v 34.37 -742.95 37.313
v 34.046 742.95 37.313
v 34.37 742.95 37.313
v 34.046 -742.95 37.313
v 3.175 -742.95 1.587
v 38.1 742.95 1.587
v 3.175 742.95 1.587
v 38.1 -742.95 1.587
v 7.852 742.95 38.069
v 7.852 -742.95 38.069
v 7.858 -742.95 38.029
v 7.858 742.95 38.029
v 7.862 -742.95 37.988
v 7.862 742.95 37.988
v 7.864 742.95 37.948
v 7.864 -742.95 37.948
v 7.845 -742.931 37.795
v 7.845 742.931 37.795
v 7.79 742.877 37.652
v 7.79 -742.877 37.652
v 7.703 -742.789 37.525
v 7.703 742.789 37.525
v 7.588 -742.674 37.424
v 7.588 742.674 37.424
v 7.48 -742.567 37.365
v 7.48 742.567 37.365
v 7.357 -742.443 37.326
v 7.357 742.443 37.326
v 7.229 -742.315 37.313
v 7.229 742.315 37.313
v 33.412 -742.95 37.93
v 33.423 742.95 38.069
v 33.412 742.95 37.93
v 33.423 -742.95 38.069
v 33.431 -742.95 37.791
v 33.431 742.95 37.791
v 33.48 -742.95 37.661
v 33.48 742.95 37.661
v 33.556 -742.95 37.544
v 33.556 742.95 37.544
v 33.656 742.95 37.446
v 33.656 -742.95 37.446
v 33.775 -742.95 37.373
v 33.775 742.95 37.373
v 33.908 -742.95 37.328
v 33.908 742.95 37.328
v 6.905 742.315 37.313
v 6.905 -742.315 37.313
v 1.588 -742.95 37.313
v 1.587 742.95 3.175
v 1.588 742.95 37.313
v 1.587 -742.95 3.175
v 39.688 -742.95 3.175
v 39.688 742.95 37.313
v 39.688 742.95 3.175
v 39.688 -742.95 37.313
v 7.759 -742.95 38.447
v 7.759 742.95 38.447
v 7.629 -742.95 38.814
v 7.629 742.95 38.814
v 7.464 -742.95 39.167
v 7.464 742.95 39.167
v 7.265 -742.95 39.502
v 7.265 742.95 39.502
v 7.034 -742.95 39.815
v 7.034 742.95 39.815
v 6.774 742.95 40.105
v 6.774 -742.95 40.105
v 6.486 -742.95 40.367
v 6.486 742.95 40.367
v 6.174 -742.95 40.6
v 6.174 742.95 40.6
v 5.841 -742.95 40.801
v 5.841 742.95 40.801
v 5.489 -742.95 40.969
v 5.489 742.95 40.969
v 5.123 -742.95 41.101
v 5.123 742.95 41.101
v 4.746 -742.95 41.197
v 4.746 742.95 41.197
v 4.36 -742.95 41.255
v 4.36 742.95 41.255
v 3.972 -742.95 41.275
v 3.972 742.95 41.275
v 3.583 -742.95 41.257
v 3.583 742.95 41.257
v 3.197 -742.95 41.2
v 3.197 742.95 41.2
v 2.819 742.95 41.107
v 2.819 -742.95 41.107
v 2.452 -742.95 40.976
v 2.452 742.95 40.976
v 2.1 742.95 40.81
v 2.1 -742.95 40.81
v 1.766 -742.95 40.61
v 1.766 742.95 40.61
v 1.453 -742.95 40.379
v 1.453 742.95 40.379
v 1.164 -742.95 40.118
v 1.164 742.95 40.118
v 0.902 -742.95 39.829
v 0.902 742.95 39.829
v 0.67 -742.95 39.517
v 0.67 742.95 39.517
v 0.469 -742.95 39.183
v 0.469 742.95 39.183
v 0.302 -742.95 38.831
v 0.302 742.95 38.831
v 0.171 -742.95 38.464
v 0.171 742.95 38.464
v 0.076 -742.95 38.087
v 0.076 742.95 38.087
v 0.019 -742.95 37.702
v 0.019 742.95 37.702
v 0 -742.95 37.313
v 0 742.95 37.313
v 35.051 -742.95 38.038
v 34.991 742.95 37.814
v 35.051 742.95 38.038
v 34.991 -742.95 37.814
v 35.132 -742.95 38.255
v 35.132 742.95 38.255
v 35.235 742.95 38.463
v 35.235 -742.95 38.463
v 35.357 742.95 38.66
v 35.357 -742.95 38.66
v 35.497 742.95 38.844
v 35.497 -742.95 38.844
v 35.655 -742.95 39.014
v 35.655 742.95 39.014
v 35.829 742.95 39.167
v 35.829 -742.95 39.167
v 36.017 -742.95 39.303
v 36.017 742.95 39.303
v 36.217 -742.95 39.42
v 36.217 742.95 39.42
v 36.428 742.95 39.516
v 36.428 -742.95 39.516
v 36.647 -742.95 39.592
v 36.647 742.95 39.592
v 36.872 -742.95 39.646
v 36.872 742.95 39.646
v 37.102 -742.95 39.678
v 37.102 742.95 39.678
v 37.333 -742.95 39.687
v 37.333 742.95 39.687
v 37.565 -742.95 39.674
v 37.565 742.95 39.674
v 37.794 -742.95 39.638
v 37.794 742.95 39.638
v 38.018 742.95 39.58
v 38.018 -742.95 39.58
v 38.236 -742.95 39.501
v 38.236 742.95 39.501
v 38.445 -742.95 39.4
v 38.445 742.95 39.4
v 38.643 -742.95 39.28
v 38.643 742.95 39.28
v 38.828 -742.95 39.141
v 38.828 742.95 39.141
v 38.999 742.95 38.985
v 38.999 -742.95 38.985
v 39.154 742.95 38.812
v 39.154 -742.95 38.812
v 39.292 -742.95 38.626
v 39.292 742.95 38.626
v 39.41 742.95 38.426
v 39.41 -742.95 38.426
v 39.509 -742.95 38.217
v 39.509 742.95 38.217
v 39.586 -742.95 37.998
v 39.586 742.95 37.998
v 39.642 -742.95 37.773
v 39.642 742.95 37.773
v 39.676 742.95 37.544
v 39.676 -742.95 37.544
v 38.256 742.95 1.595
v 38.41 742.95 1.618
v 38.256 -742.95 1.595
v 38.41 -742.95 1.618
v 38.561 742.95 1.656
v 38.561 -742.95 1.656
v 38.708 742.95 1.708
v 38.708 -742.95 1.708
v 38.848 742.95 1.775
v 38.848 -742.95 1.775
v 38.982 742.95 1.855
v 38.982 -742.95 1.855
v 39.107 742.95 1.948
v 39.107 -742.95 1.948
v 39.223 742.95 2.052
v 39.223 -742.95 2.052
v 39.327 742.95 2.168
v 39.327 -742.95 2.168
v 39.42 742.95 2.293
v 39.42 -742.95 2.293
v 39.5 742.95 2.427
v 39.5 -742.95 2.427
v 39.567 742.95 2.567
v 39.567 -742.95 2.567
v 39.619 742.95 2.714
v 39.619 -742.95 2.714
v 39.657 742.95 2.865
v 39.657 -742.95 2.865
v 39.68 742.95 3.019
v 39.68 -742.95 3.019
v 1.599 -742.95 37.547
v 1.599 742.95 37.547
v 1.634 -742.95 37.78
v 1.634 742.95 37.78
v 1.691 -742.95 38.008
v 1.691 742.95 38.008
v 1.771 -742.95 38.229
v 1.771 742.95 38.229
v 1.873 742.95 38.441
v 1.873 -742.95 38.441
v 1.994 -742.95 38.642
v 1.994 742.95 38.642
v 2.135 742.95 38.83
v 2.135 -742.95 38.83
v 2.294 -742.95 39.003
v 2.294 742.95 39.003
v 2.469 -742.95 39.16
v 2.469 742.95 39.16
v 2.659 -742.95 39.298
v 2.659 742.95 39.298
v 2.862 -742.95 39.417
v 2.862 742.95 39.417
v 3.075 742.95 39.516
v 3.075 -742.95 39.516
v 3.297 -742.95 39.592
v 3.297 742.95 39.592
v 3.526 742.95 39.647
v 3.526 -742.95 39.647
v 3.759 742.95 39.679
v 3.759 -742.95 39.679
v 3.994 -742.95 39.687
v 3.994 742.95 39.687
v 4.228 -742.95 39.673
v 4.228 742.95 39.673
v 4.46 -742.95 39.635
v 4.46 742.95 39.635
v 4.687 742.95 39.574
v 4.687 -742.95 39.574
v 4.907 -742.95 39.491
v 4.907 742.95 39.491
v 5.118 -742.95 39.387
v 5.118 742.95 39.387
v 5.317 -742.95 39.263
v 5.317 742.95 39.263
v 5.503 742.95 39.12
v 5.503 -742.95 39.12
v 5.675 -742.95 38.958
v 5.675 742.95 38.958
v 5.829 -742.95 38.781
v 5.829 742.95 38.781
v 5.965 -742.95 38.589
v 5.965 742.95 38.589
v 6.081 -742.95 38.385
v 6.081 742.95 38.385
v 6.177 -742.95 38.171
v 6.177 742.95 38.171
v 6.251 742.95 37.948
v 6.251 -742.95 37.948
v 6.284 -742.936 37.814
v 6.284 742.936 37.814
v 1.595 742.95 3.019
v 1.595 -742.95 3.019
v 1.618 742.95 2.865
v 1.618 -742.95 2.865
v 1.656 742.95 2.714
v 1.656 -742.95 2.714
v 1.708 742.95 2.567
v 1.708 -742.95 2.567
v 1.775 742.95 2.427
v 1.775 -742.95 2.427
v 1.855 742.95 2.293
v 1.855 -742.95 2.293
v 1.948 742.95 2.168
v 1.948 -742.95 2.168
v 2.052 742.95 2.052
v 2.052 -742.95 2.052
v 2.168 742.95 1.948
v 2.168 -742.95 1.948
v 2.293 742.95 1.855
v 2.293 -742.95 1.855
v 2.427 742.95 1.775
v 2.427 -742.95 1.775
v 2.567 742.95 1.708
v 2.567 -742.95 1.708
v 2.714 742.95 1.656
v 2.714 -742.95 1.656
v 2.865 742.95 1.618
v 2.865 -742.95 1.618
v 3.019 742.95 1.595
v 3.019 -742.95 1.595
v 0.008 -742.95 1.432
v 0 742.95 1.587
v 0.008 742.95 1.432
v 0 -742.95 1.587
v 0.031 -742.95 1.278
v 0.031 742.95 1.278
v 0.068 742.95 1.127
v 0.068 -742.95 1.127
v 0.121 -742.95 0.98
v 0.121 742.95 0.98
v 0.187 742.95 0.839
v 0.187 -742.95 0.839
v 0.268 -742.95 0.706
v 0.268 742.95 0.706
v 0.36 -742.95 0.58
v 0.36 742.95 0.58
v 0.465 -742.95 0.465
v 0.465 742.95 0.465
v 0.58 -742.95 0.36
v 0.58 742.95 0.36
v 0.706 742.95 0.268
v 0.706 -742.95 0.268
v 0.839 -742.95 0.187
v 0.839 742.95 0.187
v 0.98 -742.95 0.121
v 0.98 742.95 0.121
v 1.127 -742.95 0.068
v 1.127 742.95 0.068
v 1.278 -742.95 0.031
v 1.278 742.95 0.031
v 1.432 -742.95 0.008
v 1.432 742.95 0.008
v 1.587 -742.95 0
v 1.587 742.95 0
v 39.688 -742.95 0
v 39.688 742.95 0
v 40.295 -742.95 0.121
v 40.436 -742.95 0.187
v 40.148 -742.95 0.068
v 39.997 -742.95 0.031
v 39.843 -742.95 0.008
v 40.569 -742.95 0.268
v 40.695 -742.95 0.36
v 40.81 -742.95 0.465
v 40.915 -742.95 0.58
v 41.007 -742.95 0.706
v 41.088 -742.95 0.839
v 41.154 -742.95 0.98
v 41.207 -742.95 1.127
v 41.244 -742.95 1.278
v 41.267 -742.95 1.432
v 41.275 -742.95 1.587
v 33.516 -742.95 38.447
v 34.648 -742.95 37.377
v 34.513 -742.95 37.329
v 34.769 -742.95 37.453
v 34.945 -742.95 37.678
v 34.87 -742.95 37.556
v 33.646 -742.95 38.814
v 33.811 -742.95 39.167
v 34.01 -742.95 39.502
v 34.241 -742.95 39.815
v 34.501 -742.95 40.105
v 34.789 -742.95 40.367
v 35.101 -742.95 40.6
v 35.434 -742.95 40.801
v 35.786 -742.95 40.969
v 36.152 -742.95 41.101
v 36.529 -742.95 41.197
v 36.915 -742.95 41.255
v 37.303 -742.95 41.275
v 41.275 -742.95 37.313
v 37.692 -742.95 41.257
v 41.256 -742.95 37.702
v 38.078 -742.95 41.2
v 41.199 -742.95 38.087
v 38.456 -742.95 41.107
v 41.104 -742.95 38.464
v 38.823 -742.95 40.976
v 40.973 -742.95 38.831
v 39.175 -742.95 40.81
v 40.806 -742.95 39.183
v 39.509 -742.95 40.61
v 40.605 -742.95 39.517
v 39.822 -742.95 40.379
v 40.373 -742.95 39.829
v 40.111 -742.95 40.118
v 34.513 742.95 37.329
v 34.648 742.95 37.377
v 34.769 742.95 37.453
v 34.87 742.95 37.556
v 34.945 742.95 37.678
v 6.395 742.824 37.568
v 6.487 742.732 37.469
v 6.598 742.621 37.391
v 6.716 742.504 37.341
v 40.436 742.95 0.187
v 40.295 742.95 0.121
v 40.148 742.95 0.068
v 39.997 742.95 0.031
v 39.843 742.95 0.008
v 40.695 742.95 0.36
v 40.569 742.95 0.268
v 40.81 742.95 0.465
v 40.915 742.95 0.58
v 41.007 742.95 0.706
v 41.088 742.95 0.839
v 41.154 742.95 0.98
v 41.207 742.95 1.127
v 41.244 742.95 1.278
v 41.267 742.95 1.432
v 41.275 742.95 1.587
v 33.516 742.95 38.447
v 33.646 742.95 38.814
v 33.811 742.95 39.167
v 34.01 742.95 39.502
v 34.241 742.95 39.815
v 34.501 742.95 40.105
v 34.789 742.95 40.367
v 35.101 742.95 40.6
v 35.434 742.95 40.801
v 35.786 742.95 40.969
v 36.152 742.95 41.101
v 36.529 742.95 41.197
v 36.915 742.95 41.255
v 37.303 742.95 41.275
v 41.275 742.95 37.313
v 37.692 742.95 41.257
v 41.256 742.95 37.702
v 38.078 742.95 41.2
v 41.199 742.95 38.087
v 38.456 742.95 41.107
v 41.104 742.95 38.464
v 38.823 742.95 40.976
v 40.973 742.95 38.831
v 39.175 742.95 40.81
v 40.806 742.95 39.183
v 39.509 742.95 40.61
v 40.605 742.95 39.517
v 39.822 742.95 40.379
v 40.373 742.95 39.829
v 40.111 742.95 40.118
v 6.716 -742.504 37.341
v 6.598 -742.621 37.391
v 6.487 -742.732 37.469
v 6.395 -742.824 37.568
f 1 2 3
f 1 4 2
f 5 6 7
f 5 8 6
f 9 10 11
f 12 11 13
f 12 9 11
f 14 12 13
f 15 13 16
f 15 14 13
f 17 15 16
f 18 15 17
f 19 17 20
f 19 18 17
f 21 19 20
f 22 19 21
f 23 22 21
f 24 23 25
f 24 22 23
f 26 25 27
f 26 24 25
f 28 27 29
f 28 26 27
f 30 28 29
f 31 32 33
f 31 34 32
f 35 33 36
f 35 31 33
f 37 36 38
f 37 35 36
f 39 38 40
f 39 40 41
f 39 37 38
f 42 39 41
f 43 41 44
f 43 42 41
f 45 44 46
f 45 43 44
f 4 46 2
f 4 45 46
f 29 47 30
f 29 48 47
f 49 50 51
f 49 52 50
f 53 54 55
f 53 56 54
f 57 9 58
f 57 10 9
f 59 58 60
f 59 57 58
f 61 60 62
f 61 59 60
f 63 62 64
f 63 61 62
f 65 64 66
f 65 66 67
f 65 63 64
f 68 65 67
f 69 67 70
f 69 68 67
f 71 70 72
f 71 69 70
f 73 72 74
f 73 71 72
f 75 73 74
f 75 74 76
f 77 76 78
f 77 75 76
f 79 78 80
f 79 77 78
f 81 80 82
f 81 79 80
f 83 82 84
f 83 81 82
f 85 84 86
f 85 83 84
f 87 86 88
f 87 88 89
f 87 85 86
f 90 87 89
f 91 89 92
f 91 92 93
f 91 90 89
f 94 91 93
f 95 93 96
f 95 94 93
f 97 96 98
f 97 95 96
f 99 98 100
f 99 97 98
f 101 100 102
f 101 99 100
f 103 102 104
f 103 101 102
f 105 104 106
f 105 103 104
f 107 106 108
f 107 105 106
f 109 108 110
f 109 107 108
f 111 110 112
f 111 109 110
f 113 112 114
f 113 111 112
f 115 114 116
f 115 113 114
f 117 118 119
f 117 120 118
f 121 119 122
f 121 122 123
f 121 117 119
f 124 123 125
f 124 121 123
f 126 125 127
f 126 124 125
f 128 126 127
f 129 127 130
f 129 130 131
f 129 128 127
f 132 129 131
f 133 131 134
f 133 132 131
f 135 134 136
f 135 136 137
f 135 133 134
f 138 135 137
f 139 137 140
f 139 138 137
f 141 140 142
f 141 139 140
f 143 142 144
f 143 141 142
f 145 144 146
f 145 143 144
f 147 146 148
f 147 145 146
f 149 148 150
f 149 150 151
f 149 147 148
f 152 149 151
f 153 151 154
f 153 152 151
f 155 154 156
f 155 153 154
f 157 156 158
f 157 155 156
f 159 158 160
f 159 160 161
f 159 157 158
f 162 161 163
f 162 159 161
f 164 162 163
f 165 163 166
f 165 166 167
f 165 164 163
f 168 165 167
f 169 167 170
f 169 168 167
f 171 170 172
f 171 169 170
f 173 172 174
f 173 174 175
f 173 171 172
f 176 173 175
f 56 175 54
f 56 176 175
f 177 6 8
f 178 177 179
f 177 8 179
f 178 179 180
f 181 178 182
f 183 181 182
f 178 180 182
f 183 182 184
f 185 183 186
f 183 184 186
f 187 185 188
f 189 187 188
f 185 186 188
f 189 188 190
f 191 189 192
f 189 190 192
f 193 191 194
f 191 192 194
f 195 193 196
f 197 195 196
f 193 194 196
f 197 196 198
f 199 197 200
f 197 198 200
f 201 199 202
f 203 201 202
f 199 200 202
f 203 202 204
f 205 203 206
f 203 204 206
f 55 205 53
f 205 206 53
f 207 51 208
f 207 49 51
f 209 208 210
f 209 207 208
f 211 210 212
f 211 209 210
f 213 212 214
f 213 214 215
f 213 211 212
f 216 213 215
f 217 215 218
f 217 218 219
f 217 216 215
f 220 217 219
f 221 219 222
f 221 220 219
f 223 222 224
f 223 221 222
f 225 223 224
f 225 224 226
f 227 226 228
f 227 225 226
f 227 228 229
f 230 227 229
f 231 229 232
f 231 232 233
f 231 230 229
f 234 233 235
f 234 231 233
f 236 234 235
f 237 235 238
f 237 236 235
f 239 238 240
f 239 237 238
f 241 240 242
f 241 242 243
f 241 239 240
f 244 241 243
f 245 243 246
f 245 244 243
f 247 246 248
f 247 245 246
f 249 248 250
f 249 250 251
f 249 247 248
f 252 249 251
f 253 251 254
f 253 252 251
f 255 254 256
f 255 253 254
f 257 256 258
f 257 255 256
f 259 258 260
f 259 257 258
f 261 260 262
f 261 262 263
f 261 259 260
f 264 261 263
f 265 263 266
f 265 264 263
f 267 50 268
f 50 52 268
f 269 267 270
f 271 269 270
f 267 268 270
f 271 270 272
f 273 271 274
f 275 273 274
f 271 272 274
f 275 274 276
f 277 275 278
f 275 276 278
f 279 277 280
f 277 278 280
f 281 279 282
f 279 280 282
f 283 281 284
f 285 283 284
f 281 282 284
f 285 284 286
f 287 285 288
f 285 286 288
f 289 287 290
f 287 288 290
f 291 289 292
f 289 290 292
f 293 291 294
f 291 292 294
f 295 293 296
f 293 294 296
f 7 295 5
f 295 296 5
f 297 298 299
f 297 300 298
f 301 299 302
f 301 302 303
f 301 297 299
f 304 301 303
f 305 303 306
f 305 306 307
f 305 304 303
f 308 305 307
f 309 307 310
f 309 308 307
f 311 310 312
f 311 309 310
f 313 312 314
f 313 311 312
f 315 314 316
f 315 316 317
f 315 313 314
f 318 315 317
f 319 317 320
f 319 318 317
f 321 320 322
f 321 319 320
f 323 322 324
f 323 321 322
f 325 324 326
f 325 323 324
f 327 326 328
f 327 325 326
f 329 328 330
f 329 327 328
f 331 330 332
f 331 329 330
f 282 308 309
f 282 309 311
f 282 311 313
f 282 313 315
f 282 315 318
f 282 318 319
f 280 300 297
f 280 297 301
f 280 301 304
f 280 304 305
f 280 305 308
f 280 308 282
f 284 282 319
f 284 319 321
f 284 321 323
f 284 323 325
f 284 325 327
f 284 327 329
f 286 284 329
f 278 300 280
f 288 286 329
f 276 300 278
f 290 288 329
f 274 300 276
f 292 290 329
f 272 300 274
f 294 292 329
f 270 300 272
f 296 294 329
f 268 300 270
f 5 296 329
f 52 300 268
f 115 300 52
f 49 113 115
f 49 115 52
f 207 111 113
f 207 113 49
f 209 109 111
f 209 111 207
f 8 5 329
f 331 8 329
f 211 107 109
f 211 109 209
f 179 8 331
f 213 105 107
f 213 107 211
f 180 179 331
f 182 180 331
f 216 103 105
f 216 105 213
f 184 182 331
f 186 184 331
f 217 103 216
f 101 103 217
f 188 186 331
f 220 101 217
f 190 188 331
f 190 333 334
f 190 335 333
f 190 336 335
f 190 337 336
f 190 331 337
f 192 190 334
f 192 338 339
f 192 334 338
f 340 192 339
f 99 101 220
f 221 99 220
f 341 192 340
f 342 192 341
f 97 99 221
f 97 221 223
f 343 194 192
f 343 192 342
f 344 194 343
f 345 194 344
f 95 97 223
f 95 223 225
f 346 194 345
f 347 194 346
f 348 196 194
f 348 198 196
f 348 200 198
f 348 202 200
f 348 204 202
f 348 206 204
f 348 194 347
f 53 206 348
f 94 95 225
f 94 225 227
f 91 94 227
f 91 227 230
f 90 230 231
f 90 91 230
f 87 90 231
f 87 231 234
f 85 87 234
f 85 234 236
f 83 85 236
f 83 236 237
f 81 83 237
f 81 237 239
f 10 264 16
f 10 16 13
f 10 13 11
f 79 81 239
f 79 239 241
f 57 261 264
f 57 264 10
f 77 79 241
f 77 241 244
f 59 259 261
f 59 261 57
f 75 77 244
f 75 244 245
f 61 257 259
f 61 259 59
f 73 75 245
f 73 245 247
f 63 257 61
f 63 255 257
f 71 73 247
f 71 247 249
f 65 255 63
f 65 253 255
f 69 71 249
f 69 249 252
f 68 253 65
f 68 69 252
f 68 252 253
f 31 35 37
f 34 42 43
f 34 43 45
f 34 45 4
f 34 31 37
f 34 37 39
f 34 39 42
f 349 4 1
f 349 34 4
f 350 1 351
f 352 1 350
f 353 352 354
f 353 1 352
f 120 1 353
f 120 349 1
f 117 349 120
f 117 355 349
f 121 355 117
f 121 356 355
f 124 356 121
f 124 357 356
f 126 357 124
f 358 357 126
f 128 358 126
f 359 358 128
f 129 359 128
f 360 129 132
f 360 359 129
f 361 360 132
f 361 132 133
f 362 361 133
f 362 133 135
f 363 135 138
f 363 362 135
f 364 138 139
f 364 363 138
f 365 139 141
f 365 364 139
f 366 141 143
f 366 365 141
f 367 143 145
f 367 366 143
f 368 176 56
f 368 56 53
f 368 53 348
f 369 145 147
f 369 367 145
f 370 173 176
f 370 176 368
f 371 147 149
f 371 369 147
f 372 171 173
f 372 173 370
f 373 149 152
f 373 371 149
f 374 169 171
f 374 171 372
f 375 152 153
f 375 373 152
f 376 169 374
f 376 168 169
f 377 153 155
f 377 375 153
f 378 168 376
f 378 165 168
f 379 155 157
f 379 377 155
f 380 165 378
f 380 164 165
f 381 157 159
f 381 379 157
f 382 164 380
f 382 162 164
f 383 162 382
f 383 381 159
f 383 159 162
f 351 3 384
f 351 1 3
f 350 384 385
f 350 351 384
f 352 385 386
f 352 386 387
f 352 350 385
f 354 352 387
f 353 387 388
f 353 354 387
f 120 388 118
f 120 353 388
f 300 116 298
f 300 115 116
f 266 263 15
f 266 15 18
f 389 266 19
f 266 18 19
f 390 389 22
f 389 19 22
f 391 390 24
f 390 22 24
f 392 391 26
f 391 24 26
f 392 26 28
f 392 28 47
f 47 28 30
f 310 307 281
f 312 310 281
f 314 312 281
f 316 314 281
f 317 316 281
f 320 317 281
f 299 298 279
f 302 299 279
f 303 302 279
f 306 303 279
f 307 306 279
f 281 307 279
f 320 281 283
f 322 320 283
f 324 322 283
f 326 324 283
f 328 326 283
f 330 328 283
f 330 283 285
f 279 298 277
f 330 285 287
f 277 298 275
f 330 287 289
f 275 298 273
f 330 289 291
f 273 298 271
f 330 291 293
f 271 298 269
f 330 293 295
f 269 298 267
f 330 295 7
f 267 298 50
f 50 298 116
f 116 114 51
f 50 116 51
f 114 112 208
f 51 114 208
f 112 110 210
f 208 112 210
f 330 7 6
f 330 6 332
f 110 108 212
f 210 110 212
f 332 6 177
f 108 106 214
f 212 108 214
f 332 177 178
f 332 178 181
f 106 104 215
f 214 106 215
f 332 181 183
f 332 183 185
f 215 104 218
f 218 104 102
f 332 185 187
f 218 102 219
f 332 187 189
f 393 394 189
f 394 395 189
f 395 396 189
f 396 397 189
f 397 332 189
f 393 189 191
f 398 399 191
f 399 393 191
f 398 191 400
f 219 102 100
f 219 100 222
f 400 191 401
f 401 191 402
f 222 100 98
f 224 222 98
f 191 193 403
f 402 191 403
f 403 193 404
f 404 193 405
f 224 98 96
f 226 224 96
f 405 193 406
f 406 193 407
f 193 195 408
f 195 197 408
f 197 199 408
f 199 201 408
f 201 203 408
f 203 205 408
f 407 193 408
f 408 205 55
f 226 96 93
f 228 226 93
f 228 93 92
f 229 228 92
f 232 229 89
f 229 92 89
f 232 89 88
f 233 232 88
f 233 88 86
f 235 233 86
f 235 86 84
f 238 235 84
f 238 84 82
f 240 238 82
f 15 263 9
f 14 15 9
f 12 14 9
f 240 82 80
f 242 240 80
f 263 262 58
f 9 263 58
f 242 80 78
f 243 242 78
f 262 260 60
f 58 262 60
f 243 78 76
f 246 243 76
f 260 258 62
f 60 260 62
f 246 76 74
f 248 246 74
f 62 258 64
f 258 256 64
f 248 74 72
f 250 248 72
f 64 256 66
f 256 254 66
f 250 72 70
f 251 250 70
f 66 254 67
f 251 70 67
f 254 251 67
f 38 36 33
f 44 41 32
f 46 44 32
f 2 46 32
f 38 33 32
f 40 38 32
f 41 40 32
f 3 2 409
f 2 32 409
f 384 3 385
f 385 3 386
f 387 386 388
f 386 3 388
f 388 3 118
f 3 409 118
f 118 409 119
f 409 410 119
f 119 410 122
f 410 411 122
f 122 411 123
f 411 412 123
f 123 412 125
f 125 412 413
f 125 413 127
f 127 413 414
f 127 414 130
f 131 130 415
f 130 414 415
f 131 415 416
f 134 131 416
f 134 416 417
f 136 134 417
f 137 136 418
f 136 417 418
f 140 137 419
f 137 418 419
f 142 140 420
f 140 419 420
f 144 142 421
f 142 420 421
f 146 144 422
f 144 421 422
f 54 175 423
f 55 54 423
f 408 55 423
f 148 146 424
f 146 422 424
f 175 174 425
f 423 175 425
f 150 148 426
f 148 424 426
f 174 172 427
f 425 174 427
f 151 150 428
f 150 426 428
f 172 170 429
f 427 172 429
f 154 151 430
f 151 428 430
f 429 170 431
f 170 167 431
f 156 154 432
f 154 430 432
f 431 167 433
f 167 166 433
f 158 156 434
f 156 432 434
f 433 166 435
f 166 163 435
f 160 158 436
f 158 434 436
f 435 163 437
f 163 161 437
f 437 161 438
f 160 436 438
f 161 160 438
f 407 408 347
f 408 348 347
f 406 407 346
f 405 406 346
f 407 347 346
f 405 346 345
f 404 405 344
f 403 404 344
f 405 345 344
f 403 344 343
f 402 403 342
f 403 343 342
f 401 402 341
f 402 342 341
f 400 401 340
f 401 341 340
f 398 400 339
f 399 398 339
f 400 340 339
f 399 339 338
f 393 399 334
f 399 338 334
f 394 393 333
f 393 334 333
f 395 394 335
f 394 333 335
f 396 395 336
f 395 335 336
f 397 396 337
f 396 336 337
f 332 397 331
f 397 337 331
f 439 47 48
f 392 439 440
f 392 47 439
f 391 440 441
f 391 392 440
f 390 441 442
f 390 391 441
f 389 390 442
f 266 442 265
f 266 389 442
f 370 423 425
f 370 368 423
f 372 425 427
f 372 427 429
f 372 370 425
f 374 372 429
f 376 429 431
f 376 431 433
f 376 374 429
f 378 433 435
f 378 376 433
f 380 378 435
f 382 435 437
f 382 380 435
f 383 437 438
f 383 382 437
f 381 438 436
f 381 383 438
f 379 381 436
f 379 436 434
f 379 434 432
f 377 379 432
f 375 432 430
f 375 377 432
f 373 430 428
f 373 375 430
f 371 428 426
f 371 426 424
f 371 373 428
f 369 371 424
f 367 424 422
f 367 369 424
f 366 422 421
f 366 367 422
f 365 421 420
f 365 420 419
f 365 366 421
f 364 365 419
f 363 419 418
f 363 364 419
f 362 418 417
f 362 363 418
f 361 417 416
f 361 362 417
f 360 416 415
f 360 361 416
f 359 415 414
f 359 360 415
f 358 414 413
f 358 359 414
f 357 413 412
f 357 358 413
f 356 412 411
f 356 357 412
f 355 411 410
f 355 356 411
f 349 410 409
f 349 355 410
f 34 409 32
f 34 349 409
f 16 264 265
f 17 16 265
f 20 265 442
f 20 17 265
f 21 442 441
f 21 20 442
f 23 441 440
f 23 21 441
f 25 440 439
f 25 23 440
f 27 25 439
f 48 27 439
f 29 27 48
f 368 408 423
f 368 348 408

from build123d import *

# Parameters (mm, degrees)
F1_DEPTH = 742.95
F2_R     = 1.5875
F3_R     = 0.635


with BuildPart() as f1:
    # F0 (on Front) → F1 (new body, symmetric)
    with BuildSketch(Plane.XZ):
        with BuildLine():
            Line((0, 37.3126), (0, 0))
            Line((0, 0), (41.275, 0))
            Line((41.275, 0), (41.275, 37.3126))
            ThreePointArc((41.275, 37.3126), (37.3126, 41.275), (33.3502, 37.3126))
            Line((33.3502, 37.3126), (34.9377, 37.3126))
            ThreePointArc((34.9377, 37.3126), (37.3126, 39.6875), (39.6875, 37.3126))
            Line((39.6875, 37.3126), (39.6875, 1.5875))
            Line((39.6875, 1.5875), (1.5875, 1.5875))
            Line((1.5875, 1.5875), (1.5875, 37.3126))
            ThreePointArc((1.5875, 37.3126), (3.9624, 39.6875), (6.3373, 37.3126))
            Line((6.3373, 37.3126), (7.9248, 37.3126))
            ThreePointArc((7.9248, 37.3126), (3.9624, 41.275), (0, 37.3126))
        make_face()
    extrude(amount=F1_DEPTH, both=True)

    # F2
    f2_edges = [f1.edges().sort_by_distance(p)[0] for p in [
        (1.5875, 0, 1.5875),
        (39.6875, 0, 1.5875),
        (0, 0, 0),
        (41.275, 0, 0),
    ]]
    fillet(f2_edges, radius=F2_R)

    # F3
    f3_edges = [f1.edges().sort_by_distance(p)[0] for p in [
        (7.13105, 742.95, 37.3126),
        (7.9248, 0, 37.3126),
        (7.13105, -742.95, 37.3126),
        (6.3373, 0, 37.3126),
        (33.3502, 0, 37.3126),
        (34.9377, 0, 37.3126),
    ]]
    fillet(f3_edges, radius=F3_R)


solid = f1.part
